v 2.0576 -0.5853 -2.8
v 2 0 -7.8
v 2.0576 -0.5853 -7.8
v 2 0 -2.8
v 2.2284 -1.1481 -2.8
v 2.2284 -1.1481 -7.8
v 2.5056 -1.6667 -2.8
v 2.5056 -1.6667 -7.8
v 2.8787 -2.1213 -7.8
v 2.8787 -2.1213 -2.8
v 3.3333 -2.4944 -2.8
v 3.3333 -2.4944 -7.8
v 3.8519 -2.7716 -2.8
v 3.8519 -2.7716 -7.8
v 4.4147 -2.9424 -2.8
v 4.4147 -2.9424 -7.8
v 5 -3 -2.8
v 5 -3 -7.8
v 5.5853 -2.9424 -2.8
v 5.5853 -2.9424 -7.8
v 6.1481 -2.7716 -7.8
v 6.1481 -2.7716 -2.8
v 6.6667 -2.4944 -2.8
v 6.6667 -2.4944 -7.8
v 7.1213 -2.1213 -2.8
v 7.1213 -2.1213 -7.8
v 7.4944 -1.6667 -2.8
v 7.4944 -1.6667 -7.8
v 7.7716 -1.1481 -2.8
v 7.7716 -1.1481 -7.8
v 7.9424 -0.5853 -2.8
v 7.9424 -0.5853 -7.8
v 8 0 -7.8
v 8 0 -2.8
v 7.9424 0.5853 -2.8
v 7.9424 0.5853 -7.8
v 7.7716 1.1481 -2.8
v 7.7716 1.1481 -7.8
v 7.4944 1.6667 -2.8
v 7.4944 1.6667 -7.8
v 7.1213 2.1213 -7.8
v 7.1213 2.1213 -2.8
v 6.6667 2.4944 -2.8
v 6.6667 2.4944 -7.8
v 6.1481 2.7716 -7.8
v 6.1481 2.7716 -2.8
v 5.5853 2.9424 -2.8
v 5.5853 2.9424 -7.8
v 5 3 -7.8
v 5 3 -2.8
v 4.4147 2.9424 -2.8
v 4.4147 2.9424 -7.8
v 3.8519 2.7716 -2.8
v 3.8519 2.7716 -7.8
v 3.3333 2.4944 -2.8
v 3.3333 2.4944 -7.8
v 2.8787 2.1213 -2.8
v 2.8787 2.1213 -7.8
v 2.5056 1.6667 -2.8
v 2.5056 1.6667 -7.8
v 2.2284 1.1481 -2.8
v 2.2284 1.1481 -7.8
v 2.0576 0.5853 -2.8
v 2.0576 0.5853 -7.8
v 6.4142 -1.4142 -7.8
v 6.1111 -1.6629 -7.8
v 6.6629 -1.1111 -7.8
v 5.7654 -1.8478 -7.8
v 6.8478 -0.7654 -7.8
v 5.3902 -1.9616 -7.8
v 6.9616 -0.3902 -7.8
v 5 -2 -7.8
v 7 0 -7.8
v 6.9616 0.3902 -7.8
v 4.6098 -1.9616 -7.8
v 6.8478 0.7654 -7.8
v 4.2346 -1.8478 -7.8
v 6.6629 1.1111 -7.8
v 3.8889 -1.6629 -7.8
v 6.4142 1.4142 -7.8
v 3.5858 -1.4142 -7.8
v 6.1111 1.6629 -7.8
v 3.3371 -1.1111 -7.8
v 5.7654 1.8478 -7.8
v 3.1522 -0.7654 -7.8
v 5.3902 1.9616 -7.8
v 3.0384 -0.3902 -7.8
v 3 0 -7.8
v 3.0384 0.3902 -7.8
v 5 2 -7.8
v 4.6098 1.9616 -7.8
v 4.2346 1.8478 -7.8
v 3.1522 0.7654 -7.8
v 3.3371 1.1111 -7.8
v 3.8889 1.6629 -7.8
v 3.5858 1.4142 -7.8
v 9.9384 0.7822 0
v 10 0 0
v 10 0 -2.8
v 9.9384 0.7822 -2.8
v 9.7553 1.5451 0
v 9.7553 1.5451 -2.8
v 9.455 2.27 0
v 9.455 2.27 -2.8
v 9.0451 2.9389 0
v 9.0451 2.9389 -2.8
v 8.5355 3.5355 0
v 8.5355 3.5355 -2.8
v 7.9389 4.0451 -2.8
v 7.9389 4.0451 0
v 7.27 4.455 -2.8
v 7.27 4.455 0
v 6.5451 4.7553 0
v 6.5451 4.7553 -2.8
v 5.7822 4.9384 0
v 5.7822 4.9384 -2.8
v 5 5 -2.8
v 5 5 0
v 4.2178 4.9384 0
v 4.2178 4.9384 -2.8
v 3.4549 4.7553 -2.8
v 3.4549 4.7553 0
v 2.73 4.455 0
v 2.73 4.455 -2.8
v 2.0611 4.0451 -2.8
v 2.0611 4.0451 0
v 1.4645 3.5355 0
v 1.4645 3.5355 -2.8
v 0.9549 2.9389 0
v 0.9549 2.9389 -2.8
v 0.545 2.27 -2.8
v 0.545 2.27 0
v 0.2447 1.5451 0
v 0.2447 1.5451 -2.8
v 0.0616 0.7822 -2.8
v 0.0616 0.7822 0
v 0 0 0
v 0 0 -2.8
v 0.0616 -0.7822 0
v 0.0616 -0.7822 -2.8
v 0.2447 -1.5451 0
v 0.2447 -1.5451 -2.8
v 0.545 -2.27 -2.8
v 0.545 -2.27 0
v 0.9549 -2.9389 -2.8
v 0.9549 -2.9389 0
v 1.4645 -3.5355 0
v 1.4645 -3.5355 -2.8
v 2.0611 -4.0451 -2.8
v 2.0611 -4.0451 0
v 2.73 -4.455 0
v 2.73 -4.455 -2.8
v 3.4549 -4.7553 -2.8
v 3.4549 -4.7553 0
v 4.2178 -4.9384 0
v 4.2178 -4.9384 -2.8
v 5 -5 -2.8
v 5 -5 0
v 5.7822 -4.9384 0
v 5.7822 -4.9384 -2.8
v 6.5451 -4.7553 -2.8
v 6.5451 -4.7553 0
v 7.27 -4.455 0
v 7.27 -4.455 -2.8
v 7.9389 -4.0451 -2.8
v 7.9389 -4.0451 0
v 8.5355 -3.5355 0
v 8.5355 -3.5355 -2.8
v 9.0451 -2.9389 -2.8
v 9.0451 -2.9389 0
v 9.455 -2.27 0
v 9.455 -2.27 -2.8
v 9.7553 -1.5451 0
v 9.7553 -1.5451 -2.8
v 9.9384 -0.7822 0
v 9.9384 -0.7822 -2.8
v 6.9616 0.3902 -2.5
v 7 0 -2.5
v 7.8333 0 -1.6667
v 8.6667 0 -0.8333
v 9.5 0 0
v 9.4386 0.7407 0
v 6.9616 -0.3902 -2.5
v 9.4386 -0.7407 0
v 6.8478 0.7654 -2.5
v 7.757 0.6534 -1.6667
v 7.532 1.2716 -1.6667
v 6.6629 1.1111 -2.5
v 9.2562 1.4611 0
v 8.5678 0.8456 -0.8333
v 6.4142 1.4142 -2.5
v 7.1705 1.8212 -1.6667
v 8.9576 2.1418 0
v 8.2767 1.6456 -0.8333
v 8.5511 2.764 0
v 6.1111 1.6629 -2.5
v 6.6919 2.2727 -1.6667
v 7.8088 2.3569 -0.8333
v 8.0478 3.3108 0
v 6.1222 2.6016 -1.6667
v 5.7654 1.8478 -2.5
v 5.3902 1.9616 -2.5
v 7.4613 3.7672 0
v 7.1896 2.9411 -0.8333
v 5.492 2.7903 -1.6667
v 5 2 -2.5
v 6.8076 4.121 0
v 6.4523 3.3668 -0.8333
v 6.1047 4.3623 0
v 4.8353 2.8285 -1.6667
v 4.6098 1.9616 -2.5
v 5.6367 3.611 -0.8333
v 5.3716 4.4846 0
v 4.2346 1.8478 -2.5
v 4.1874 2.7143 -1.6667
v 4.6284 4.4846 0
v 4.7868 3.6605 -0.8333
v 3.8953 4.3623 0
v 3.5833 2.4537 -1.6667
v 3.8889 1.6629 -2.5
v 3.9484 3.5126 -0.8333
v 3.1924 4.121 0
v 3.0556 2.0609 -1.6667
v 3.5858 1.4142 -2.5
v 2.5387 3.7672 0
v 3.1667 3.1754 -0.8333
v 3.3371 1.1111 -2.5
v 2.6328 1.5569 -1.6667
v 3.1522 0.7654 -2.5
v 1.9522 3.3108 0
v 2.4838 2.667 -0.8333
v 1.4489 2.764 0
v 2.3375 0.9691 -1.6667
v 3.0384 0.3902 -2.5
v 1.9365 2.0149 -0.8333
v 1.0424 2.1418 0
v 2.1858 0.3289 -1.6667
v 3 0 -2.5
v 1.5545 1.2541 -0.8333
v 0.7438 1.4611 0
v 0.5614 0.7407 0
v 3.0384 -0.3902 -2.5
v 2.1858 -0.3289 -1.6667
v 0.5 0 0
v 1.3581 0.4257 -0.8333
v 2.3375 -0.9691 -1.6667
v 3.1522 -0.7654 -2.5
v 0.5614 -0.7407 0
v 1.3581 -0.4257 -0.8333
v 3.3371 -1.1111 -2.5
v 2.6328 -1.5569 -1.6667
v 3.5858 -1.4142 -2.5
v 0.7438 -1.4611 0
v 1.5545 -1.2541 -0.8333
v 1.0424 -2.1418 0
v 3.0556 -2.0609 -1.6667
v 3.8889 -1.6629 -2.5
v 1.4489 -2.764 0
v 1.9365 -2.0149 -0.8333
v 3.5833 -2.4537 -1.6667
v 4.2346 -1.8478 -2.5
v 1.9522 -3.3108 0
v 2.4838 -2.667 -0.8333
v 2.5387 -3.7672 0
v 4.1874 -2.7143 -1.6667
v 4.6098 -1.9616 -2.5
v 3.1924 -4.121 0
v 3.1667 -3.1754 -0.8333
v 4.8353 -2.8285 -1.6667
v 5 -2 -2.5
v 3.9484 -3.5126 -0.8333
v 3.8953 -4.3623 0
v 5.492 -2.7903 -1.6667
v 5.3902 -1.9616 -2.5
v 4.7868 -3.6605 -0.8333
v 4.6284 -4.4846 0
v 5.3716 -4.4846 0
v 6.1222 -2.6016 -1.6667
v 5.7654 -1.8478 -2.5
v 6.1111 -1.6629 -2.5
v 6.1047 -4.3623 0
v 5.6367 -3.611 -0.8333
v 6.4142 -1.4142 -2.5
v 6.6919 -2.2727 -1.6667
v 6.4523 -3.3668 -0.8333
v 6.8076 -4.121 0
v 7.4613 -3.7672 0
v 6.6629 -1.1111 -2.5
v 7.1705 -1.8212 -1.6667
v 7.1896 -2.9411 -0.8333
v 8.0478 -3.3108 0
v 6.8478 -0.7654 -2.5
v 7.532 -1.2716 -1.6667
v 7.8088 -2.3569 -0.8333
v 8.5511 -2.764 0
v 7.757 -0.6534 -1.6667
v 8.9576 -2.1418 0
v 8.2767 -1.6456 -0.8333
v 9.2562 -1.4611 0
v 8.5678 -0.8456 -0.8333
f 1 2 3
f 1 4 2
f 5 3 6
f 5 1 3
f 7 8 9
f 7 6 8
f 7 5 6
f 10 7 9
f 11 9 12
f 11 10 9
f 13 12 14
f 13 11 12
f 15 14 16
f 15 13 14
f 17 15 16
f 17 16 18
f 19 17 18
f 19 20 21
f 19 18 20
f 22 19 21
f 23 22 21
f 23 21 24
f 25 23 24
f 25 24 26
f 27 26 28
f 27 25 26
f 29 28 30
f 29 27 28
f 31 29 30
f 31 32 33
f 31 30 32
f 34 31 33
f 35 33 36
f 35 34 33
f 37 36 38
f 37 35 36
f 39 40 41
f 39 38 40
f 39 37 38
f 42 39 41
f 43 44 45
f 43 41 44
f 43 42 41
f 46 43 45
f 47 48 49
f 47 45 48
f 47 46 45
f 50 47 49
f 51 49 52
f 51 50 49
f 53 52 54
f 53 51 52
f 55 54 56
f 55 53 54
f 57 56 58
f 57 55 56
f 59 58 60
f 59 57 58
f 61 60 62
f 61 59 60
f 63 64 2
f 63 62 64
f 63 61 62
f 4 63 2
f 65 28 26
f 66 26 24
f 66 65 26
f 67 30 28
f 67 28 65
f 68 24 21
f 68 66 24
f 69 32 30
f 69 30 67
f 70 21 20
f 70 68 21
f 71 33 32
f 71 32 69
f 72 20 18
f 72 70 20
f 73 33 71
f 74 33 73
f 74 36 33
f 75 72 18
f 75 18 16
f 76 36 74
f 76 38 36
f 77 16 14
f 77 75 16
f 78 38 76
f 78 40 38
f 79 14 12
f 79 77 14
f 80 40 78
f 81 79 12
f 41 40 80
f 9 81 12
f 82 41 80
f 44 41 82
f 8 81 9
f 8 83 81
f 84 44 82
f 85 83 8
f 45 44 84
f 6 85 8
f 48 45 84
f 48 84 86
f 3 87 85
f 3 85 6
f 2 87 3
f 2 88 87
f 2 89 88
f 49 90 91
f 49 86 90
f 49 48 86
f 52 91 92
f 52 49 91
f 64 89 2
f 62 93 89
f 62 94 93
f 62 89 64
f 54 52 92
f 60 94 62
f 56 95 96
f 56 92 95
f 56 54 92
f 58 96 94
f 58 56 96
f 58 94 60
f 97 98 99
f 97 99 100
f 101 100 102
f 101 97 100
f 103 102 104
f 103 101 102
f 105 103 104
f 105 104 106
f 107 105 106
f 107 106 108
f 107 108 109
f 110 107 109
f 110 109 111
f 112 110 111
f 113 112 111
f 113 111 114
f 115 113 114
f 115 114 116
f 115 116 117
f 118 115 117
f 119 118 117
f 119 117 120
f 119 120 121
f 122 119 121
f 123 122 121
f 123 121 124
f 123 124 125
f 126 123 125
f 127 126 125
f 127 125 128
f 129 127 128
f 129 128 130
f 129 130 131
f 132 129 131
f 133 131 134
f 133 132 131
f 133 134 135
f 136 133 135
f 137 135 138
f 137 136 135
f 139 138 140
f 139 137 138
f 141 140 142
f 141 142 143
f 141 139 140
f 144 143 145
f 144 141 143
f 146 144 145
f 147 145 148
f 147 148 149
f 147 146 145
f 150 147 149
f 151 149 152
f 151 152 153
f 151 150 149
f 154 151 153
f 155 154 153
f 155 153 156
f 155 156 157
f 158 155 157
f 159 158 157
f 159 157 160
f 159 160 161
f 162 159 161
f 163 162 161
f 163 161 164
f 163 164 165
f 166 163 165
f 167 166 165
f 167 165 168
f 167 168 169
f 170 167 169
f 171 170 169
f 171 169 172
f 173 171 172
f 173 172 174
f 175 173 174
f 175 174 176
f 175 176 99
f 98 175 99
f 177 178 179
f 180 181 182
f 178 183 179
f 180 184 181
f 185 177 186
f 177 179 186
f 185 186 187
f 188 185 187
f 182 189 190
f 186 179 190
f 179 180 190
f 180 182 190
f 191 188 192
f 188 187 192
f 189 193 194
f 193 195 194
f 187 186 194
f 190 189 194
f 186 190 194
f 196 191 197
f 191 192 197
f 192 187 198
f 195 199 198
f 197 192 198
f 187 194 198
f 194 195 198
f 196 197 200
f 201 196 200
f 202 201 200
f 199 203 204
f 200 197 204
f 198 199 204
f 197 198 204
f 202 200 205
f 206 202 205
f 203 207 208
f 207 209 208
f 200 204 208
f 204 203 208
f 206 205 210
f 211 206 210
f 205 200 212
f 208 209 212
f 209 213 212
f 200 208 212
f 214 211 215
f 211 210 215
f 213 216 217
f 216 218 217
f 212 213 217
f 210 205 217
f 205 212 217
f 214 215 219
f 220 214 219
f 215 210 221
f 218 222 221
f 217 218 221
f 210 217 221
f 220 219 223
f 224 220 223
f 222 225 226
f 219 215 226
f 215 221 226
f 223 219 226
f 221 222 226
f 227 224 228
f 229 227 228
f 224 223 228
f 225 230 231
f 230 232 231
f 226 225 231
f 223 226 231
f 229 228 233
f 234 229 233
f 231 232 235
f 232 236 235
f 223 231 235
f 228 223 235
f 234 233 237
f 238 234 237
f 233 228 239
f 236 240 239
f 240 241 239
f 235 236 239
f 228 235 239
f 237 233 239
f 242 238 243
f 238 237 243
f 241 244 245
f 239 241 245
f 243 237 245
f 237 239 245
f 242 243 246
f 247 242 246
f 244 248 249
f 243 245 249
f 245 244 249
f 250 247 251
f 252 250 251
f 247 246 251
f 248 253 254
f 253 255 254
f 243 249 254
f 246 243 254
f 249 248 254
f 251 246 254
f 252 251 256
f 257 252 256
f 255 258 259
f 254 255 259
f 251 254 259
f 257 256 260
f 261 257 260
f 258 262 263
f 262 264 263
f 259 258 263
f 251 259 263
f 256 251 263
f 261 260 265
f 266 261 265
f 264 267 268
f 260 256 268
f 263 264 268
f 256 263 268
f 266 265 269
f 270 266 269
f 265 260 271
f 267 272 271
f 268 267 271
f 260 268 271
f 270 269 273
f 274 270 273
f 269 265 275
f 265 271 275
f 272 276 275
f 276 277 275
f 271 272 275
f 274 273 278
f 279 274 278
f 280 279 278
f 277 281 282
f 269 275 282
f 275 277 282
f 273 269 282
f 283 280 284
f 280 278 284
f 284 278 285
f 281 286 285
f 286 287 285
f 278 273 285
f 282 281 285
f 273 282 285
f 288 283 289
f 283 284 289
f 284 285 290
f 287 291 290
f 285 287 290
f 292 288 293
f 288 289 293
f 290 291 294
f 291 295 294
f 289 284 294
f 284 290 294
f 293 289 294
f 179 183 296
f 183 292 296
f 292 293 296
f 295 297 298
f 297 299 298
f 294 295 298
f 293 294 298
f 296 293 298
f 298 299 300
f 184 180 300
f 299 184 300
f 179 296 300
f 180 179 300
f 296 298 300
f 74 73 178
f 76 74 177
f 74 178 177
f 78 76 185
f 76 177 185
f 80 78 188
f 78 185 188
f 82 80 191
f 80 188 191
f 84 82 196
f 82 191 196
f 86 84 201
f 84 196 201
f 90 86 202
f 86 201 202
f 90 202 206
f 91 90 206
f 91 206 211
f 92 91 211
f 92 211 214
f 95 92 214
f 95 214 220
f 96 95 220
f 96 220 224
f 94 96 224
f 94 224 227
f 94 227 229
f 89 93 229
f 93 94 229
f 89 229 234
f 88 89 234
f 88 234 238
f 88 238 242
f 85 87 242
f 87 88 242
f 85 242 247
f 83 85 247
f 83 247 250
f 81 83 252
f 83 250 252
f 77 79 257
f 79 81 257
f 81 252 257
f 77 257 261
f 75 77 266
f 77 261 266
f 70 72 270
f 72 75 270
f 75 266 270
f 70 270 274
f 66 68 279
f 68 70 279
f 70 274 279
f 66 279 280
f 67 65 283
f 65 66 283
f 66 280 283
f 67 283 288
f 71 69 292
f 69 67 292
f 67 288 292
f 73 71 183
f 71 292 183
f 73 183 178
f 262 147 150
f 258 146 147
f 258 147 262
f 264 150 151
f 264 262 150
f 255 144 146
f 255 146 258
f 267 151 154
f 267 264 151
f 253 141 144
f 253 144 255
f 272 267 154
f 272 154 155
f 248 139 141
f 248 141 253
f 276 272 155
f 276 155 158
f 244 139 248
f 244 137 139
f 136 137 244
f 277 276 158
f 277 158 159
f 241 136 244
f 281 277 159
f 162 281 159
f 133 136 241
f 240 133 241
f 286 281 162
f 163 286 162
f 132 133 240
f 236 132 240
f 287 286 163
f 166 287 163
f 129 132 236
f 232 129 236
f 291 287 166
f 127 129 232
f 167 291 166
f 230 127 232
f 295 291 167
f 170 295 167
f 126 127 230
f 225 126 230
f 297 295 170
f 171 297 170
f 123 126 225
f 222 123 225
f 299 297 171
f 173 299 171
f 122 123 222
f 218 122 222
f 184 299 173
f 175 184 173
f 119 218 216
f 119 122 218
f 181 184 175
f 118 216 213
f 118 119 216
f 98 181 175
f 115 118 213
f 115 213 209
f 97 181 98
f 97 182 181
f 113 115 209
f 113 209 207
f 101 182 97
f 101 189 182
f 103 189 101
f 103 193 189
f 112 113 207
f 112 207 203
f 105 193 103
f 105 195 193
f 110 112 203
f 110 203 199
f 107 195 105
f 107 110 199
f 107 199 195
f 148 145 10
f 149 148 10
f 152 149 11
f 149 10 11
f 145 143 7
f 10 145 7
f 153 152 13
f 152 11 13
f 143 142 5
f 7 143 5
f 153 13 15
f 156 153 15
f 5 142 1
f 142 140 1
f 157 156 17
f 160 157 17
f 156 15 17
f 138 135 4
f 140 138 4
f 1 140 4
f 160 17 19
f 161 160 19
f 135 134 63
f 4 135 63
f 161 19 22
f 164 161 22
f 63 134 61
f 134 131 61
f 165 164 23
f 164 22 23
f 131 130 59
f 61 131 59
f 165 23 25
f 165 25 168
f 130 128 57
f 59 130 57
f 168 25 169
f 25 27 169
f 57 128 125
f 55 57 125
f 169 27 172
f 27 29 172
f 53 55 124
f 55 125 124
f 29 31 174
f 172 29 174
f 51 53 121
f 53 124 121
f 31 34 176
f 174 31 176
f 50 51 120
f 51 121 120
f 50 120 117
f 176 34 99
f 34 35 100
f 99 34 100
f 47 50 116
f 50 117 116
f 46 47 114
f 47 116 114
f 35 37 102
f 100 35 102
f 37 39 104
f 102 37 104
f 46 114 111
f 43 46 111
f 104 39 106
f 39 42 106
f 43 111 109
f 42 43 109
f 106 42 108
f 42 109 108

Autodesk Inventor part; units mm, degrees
ref_plane "YZ Plane" through (0, 0, 0) normal (1, 0, 0) x (0, 1, 0)
sketch "스케치1" plane through (0, 0, 0) normal (0, 0, 1) x (1, 0, 0)
  line L0 (5, 1.4434) -> (6.25, 0.7217) projected
  line L1 (6.25, 0.7217) -> (6.25, -0.7217) projected
  line L2 (6.25, -0.7217) -> (5, -1.4434) projected
  line L3 (5, -1.4434) -> (3.75, -0.7217) projected
  line L4 (3.75, -0.7217) -> (3.75, 0.7217) projected
  line L5 (3.75, 0.7217) -> (5, 1.4434) projected
  circle A0 centre (5, 0) radius 5 projected
  circle A1 centre (5, 0) radius 5
  point P0 (0, 0)
ref_plane "작업 평면1" through (-0.2823, -5.2823, -2.8) normal (0, 0, -1) x (0, 1, 0)
extrude "돌출1" add sketch "스케치1" against normal up to surface (2.8 mm away)
sketch "스케치2" plane through (5, 0, -2.8) normal (0, 0, -1) x (-1, 0, 0)
  circle A0 centre (0, 0) radius 3 projected
  circle A1 centre (0, 0) radius 2 projected
  point P0 (5, 0)
ref_plane "작업 평면2" through (1.8306, -3.1694, -7.8) normal (0, 0, -1) x (0, 1, 0)
extrude "돌출2" add sketch "스케치2" along normal up to surface (5 mm away)
sketch "스케치3" plane through (5, 0, 0) normal (0, 0, 1) x (1, 0, 0)
  circle A0 centre (0, 0) radius 5 projected
  line L0 (0, 1.4434) -> (1.25, 0.7217) projected
  line L1 (1.25, 0.7217) -> (1.25, -0.7217) projected
  line L2 (1.25, -0.7217) -> (0, -1.4434) projected
  line L3 (0, -1.4434) -> (-1.25, -0.7217) projected
  line L4 (-1.25, -0.7217) -> (-1.25, 0.7217) projected
  line L5 (-1.25, 0.7217) -> (0, 1.4434) projected
  circle A1 centre (0, 0) radius 2
  point P0 (-5, 0)
  dimension "d4" = 4
extrude "돌출3" cut sketch "스케치3" against normal through all contours L0 L1 L2 L3 L4 L5 | A1
chamfer "모따기1" distance 2.5 angle 45 1 edges at (3, 0, 0)
properties part number "Handmade tiered cover" material "LCP 플라스틱"
